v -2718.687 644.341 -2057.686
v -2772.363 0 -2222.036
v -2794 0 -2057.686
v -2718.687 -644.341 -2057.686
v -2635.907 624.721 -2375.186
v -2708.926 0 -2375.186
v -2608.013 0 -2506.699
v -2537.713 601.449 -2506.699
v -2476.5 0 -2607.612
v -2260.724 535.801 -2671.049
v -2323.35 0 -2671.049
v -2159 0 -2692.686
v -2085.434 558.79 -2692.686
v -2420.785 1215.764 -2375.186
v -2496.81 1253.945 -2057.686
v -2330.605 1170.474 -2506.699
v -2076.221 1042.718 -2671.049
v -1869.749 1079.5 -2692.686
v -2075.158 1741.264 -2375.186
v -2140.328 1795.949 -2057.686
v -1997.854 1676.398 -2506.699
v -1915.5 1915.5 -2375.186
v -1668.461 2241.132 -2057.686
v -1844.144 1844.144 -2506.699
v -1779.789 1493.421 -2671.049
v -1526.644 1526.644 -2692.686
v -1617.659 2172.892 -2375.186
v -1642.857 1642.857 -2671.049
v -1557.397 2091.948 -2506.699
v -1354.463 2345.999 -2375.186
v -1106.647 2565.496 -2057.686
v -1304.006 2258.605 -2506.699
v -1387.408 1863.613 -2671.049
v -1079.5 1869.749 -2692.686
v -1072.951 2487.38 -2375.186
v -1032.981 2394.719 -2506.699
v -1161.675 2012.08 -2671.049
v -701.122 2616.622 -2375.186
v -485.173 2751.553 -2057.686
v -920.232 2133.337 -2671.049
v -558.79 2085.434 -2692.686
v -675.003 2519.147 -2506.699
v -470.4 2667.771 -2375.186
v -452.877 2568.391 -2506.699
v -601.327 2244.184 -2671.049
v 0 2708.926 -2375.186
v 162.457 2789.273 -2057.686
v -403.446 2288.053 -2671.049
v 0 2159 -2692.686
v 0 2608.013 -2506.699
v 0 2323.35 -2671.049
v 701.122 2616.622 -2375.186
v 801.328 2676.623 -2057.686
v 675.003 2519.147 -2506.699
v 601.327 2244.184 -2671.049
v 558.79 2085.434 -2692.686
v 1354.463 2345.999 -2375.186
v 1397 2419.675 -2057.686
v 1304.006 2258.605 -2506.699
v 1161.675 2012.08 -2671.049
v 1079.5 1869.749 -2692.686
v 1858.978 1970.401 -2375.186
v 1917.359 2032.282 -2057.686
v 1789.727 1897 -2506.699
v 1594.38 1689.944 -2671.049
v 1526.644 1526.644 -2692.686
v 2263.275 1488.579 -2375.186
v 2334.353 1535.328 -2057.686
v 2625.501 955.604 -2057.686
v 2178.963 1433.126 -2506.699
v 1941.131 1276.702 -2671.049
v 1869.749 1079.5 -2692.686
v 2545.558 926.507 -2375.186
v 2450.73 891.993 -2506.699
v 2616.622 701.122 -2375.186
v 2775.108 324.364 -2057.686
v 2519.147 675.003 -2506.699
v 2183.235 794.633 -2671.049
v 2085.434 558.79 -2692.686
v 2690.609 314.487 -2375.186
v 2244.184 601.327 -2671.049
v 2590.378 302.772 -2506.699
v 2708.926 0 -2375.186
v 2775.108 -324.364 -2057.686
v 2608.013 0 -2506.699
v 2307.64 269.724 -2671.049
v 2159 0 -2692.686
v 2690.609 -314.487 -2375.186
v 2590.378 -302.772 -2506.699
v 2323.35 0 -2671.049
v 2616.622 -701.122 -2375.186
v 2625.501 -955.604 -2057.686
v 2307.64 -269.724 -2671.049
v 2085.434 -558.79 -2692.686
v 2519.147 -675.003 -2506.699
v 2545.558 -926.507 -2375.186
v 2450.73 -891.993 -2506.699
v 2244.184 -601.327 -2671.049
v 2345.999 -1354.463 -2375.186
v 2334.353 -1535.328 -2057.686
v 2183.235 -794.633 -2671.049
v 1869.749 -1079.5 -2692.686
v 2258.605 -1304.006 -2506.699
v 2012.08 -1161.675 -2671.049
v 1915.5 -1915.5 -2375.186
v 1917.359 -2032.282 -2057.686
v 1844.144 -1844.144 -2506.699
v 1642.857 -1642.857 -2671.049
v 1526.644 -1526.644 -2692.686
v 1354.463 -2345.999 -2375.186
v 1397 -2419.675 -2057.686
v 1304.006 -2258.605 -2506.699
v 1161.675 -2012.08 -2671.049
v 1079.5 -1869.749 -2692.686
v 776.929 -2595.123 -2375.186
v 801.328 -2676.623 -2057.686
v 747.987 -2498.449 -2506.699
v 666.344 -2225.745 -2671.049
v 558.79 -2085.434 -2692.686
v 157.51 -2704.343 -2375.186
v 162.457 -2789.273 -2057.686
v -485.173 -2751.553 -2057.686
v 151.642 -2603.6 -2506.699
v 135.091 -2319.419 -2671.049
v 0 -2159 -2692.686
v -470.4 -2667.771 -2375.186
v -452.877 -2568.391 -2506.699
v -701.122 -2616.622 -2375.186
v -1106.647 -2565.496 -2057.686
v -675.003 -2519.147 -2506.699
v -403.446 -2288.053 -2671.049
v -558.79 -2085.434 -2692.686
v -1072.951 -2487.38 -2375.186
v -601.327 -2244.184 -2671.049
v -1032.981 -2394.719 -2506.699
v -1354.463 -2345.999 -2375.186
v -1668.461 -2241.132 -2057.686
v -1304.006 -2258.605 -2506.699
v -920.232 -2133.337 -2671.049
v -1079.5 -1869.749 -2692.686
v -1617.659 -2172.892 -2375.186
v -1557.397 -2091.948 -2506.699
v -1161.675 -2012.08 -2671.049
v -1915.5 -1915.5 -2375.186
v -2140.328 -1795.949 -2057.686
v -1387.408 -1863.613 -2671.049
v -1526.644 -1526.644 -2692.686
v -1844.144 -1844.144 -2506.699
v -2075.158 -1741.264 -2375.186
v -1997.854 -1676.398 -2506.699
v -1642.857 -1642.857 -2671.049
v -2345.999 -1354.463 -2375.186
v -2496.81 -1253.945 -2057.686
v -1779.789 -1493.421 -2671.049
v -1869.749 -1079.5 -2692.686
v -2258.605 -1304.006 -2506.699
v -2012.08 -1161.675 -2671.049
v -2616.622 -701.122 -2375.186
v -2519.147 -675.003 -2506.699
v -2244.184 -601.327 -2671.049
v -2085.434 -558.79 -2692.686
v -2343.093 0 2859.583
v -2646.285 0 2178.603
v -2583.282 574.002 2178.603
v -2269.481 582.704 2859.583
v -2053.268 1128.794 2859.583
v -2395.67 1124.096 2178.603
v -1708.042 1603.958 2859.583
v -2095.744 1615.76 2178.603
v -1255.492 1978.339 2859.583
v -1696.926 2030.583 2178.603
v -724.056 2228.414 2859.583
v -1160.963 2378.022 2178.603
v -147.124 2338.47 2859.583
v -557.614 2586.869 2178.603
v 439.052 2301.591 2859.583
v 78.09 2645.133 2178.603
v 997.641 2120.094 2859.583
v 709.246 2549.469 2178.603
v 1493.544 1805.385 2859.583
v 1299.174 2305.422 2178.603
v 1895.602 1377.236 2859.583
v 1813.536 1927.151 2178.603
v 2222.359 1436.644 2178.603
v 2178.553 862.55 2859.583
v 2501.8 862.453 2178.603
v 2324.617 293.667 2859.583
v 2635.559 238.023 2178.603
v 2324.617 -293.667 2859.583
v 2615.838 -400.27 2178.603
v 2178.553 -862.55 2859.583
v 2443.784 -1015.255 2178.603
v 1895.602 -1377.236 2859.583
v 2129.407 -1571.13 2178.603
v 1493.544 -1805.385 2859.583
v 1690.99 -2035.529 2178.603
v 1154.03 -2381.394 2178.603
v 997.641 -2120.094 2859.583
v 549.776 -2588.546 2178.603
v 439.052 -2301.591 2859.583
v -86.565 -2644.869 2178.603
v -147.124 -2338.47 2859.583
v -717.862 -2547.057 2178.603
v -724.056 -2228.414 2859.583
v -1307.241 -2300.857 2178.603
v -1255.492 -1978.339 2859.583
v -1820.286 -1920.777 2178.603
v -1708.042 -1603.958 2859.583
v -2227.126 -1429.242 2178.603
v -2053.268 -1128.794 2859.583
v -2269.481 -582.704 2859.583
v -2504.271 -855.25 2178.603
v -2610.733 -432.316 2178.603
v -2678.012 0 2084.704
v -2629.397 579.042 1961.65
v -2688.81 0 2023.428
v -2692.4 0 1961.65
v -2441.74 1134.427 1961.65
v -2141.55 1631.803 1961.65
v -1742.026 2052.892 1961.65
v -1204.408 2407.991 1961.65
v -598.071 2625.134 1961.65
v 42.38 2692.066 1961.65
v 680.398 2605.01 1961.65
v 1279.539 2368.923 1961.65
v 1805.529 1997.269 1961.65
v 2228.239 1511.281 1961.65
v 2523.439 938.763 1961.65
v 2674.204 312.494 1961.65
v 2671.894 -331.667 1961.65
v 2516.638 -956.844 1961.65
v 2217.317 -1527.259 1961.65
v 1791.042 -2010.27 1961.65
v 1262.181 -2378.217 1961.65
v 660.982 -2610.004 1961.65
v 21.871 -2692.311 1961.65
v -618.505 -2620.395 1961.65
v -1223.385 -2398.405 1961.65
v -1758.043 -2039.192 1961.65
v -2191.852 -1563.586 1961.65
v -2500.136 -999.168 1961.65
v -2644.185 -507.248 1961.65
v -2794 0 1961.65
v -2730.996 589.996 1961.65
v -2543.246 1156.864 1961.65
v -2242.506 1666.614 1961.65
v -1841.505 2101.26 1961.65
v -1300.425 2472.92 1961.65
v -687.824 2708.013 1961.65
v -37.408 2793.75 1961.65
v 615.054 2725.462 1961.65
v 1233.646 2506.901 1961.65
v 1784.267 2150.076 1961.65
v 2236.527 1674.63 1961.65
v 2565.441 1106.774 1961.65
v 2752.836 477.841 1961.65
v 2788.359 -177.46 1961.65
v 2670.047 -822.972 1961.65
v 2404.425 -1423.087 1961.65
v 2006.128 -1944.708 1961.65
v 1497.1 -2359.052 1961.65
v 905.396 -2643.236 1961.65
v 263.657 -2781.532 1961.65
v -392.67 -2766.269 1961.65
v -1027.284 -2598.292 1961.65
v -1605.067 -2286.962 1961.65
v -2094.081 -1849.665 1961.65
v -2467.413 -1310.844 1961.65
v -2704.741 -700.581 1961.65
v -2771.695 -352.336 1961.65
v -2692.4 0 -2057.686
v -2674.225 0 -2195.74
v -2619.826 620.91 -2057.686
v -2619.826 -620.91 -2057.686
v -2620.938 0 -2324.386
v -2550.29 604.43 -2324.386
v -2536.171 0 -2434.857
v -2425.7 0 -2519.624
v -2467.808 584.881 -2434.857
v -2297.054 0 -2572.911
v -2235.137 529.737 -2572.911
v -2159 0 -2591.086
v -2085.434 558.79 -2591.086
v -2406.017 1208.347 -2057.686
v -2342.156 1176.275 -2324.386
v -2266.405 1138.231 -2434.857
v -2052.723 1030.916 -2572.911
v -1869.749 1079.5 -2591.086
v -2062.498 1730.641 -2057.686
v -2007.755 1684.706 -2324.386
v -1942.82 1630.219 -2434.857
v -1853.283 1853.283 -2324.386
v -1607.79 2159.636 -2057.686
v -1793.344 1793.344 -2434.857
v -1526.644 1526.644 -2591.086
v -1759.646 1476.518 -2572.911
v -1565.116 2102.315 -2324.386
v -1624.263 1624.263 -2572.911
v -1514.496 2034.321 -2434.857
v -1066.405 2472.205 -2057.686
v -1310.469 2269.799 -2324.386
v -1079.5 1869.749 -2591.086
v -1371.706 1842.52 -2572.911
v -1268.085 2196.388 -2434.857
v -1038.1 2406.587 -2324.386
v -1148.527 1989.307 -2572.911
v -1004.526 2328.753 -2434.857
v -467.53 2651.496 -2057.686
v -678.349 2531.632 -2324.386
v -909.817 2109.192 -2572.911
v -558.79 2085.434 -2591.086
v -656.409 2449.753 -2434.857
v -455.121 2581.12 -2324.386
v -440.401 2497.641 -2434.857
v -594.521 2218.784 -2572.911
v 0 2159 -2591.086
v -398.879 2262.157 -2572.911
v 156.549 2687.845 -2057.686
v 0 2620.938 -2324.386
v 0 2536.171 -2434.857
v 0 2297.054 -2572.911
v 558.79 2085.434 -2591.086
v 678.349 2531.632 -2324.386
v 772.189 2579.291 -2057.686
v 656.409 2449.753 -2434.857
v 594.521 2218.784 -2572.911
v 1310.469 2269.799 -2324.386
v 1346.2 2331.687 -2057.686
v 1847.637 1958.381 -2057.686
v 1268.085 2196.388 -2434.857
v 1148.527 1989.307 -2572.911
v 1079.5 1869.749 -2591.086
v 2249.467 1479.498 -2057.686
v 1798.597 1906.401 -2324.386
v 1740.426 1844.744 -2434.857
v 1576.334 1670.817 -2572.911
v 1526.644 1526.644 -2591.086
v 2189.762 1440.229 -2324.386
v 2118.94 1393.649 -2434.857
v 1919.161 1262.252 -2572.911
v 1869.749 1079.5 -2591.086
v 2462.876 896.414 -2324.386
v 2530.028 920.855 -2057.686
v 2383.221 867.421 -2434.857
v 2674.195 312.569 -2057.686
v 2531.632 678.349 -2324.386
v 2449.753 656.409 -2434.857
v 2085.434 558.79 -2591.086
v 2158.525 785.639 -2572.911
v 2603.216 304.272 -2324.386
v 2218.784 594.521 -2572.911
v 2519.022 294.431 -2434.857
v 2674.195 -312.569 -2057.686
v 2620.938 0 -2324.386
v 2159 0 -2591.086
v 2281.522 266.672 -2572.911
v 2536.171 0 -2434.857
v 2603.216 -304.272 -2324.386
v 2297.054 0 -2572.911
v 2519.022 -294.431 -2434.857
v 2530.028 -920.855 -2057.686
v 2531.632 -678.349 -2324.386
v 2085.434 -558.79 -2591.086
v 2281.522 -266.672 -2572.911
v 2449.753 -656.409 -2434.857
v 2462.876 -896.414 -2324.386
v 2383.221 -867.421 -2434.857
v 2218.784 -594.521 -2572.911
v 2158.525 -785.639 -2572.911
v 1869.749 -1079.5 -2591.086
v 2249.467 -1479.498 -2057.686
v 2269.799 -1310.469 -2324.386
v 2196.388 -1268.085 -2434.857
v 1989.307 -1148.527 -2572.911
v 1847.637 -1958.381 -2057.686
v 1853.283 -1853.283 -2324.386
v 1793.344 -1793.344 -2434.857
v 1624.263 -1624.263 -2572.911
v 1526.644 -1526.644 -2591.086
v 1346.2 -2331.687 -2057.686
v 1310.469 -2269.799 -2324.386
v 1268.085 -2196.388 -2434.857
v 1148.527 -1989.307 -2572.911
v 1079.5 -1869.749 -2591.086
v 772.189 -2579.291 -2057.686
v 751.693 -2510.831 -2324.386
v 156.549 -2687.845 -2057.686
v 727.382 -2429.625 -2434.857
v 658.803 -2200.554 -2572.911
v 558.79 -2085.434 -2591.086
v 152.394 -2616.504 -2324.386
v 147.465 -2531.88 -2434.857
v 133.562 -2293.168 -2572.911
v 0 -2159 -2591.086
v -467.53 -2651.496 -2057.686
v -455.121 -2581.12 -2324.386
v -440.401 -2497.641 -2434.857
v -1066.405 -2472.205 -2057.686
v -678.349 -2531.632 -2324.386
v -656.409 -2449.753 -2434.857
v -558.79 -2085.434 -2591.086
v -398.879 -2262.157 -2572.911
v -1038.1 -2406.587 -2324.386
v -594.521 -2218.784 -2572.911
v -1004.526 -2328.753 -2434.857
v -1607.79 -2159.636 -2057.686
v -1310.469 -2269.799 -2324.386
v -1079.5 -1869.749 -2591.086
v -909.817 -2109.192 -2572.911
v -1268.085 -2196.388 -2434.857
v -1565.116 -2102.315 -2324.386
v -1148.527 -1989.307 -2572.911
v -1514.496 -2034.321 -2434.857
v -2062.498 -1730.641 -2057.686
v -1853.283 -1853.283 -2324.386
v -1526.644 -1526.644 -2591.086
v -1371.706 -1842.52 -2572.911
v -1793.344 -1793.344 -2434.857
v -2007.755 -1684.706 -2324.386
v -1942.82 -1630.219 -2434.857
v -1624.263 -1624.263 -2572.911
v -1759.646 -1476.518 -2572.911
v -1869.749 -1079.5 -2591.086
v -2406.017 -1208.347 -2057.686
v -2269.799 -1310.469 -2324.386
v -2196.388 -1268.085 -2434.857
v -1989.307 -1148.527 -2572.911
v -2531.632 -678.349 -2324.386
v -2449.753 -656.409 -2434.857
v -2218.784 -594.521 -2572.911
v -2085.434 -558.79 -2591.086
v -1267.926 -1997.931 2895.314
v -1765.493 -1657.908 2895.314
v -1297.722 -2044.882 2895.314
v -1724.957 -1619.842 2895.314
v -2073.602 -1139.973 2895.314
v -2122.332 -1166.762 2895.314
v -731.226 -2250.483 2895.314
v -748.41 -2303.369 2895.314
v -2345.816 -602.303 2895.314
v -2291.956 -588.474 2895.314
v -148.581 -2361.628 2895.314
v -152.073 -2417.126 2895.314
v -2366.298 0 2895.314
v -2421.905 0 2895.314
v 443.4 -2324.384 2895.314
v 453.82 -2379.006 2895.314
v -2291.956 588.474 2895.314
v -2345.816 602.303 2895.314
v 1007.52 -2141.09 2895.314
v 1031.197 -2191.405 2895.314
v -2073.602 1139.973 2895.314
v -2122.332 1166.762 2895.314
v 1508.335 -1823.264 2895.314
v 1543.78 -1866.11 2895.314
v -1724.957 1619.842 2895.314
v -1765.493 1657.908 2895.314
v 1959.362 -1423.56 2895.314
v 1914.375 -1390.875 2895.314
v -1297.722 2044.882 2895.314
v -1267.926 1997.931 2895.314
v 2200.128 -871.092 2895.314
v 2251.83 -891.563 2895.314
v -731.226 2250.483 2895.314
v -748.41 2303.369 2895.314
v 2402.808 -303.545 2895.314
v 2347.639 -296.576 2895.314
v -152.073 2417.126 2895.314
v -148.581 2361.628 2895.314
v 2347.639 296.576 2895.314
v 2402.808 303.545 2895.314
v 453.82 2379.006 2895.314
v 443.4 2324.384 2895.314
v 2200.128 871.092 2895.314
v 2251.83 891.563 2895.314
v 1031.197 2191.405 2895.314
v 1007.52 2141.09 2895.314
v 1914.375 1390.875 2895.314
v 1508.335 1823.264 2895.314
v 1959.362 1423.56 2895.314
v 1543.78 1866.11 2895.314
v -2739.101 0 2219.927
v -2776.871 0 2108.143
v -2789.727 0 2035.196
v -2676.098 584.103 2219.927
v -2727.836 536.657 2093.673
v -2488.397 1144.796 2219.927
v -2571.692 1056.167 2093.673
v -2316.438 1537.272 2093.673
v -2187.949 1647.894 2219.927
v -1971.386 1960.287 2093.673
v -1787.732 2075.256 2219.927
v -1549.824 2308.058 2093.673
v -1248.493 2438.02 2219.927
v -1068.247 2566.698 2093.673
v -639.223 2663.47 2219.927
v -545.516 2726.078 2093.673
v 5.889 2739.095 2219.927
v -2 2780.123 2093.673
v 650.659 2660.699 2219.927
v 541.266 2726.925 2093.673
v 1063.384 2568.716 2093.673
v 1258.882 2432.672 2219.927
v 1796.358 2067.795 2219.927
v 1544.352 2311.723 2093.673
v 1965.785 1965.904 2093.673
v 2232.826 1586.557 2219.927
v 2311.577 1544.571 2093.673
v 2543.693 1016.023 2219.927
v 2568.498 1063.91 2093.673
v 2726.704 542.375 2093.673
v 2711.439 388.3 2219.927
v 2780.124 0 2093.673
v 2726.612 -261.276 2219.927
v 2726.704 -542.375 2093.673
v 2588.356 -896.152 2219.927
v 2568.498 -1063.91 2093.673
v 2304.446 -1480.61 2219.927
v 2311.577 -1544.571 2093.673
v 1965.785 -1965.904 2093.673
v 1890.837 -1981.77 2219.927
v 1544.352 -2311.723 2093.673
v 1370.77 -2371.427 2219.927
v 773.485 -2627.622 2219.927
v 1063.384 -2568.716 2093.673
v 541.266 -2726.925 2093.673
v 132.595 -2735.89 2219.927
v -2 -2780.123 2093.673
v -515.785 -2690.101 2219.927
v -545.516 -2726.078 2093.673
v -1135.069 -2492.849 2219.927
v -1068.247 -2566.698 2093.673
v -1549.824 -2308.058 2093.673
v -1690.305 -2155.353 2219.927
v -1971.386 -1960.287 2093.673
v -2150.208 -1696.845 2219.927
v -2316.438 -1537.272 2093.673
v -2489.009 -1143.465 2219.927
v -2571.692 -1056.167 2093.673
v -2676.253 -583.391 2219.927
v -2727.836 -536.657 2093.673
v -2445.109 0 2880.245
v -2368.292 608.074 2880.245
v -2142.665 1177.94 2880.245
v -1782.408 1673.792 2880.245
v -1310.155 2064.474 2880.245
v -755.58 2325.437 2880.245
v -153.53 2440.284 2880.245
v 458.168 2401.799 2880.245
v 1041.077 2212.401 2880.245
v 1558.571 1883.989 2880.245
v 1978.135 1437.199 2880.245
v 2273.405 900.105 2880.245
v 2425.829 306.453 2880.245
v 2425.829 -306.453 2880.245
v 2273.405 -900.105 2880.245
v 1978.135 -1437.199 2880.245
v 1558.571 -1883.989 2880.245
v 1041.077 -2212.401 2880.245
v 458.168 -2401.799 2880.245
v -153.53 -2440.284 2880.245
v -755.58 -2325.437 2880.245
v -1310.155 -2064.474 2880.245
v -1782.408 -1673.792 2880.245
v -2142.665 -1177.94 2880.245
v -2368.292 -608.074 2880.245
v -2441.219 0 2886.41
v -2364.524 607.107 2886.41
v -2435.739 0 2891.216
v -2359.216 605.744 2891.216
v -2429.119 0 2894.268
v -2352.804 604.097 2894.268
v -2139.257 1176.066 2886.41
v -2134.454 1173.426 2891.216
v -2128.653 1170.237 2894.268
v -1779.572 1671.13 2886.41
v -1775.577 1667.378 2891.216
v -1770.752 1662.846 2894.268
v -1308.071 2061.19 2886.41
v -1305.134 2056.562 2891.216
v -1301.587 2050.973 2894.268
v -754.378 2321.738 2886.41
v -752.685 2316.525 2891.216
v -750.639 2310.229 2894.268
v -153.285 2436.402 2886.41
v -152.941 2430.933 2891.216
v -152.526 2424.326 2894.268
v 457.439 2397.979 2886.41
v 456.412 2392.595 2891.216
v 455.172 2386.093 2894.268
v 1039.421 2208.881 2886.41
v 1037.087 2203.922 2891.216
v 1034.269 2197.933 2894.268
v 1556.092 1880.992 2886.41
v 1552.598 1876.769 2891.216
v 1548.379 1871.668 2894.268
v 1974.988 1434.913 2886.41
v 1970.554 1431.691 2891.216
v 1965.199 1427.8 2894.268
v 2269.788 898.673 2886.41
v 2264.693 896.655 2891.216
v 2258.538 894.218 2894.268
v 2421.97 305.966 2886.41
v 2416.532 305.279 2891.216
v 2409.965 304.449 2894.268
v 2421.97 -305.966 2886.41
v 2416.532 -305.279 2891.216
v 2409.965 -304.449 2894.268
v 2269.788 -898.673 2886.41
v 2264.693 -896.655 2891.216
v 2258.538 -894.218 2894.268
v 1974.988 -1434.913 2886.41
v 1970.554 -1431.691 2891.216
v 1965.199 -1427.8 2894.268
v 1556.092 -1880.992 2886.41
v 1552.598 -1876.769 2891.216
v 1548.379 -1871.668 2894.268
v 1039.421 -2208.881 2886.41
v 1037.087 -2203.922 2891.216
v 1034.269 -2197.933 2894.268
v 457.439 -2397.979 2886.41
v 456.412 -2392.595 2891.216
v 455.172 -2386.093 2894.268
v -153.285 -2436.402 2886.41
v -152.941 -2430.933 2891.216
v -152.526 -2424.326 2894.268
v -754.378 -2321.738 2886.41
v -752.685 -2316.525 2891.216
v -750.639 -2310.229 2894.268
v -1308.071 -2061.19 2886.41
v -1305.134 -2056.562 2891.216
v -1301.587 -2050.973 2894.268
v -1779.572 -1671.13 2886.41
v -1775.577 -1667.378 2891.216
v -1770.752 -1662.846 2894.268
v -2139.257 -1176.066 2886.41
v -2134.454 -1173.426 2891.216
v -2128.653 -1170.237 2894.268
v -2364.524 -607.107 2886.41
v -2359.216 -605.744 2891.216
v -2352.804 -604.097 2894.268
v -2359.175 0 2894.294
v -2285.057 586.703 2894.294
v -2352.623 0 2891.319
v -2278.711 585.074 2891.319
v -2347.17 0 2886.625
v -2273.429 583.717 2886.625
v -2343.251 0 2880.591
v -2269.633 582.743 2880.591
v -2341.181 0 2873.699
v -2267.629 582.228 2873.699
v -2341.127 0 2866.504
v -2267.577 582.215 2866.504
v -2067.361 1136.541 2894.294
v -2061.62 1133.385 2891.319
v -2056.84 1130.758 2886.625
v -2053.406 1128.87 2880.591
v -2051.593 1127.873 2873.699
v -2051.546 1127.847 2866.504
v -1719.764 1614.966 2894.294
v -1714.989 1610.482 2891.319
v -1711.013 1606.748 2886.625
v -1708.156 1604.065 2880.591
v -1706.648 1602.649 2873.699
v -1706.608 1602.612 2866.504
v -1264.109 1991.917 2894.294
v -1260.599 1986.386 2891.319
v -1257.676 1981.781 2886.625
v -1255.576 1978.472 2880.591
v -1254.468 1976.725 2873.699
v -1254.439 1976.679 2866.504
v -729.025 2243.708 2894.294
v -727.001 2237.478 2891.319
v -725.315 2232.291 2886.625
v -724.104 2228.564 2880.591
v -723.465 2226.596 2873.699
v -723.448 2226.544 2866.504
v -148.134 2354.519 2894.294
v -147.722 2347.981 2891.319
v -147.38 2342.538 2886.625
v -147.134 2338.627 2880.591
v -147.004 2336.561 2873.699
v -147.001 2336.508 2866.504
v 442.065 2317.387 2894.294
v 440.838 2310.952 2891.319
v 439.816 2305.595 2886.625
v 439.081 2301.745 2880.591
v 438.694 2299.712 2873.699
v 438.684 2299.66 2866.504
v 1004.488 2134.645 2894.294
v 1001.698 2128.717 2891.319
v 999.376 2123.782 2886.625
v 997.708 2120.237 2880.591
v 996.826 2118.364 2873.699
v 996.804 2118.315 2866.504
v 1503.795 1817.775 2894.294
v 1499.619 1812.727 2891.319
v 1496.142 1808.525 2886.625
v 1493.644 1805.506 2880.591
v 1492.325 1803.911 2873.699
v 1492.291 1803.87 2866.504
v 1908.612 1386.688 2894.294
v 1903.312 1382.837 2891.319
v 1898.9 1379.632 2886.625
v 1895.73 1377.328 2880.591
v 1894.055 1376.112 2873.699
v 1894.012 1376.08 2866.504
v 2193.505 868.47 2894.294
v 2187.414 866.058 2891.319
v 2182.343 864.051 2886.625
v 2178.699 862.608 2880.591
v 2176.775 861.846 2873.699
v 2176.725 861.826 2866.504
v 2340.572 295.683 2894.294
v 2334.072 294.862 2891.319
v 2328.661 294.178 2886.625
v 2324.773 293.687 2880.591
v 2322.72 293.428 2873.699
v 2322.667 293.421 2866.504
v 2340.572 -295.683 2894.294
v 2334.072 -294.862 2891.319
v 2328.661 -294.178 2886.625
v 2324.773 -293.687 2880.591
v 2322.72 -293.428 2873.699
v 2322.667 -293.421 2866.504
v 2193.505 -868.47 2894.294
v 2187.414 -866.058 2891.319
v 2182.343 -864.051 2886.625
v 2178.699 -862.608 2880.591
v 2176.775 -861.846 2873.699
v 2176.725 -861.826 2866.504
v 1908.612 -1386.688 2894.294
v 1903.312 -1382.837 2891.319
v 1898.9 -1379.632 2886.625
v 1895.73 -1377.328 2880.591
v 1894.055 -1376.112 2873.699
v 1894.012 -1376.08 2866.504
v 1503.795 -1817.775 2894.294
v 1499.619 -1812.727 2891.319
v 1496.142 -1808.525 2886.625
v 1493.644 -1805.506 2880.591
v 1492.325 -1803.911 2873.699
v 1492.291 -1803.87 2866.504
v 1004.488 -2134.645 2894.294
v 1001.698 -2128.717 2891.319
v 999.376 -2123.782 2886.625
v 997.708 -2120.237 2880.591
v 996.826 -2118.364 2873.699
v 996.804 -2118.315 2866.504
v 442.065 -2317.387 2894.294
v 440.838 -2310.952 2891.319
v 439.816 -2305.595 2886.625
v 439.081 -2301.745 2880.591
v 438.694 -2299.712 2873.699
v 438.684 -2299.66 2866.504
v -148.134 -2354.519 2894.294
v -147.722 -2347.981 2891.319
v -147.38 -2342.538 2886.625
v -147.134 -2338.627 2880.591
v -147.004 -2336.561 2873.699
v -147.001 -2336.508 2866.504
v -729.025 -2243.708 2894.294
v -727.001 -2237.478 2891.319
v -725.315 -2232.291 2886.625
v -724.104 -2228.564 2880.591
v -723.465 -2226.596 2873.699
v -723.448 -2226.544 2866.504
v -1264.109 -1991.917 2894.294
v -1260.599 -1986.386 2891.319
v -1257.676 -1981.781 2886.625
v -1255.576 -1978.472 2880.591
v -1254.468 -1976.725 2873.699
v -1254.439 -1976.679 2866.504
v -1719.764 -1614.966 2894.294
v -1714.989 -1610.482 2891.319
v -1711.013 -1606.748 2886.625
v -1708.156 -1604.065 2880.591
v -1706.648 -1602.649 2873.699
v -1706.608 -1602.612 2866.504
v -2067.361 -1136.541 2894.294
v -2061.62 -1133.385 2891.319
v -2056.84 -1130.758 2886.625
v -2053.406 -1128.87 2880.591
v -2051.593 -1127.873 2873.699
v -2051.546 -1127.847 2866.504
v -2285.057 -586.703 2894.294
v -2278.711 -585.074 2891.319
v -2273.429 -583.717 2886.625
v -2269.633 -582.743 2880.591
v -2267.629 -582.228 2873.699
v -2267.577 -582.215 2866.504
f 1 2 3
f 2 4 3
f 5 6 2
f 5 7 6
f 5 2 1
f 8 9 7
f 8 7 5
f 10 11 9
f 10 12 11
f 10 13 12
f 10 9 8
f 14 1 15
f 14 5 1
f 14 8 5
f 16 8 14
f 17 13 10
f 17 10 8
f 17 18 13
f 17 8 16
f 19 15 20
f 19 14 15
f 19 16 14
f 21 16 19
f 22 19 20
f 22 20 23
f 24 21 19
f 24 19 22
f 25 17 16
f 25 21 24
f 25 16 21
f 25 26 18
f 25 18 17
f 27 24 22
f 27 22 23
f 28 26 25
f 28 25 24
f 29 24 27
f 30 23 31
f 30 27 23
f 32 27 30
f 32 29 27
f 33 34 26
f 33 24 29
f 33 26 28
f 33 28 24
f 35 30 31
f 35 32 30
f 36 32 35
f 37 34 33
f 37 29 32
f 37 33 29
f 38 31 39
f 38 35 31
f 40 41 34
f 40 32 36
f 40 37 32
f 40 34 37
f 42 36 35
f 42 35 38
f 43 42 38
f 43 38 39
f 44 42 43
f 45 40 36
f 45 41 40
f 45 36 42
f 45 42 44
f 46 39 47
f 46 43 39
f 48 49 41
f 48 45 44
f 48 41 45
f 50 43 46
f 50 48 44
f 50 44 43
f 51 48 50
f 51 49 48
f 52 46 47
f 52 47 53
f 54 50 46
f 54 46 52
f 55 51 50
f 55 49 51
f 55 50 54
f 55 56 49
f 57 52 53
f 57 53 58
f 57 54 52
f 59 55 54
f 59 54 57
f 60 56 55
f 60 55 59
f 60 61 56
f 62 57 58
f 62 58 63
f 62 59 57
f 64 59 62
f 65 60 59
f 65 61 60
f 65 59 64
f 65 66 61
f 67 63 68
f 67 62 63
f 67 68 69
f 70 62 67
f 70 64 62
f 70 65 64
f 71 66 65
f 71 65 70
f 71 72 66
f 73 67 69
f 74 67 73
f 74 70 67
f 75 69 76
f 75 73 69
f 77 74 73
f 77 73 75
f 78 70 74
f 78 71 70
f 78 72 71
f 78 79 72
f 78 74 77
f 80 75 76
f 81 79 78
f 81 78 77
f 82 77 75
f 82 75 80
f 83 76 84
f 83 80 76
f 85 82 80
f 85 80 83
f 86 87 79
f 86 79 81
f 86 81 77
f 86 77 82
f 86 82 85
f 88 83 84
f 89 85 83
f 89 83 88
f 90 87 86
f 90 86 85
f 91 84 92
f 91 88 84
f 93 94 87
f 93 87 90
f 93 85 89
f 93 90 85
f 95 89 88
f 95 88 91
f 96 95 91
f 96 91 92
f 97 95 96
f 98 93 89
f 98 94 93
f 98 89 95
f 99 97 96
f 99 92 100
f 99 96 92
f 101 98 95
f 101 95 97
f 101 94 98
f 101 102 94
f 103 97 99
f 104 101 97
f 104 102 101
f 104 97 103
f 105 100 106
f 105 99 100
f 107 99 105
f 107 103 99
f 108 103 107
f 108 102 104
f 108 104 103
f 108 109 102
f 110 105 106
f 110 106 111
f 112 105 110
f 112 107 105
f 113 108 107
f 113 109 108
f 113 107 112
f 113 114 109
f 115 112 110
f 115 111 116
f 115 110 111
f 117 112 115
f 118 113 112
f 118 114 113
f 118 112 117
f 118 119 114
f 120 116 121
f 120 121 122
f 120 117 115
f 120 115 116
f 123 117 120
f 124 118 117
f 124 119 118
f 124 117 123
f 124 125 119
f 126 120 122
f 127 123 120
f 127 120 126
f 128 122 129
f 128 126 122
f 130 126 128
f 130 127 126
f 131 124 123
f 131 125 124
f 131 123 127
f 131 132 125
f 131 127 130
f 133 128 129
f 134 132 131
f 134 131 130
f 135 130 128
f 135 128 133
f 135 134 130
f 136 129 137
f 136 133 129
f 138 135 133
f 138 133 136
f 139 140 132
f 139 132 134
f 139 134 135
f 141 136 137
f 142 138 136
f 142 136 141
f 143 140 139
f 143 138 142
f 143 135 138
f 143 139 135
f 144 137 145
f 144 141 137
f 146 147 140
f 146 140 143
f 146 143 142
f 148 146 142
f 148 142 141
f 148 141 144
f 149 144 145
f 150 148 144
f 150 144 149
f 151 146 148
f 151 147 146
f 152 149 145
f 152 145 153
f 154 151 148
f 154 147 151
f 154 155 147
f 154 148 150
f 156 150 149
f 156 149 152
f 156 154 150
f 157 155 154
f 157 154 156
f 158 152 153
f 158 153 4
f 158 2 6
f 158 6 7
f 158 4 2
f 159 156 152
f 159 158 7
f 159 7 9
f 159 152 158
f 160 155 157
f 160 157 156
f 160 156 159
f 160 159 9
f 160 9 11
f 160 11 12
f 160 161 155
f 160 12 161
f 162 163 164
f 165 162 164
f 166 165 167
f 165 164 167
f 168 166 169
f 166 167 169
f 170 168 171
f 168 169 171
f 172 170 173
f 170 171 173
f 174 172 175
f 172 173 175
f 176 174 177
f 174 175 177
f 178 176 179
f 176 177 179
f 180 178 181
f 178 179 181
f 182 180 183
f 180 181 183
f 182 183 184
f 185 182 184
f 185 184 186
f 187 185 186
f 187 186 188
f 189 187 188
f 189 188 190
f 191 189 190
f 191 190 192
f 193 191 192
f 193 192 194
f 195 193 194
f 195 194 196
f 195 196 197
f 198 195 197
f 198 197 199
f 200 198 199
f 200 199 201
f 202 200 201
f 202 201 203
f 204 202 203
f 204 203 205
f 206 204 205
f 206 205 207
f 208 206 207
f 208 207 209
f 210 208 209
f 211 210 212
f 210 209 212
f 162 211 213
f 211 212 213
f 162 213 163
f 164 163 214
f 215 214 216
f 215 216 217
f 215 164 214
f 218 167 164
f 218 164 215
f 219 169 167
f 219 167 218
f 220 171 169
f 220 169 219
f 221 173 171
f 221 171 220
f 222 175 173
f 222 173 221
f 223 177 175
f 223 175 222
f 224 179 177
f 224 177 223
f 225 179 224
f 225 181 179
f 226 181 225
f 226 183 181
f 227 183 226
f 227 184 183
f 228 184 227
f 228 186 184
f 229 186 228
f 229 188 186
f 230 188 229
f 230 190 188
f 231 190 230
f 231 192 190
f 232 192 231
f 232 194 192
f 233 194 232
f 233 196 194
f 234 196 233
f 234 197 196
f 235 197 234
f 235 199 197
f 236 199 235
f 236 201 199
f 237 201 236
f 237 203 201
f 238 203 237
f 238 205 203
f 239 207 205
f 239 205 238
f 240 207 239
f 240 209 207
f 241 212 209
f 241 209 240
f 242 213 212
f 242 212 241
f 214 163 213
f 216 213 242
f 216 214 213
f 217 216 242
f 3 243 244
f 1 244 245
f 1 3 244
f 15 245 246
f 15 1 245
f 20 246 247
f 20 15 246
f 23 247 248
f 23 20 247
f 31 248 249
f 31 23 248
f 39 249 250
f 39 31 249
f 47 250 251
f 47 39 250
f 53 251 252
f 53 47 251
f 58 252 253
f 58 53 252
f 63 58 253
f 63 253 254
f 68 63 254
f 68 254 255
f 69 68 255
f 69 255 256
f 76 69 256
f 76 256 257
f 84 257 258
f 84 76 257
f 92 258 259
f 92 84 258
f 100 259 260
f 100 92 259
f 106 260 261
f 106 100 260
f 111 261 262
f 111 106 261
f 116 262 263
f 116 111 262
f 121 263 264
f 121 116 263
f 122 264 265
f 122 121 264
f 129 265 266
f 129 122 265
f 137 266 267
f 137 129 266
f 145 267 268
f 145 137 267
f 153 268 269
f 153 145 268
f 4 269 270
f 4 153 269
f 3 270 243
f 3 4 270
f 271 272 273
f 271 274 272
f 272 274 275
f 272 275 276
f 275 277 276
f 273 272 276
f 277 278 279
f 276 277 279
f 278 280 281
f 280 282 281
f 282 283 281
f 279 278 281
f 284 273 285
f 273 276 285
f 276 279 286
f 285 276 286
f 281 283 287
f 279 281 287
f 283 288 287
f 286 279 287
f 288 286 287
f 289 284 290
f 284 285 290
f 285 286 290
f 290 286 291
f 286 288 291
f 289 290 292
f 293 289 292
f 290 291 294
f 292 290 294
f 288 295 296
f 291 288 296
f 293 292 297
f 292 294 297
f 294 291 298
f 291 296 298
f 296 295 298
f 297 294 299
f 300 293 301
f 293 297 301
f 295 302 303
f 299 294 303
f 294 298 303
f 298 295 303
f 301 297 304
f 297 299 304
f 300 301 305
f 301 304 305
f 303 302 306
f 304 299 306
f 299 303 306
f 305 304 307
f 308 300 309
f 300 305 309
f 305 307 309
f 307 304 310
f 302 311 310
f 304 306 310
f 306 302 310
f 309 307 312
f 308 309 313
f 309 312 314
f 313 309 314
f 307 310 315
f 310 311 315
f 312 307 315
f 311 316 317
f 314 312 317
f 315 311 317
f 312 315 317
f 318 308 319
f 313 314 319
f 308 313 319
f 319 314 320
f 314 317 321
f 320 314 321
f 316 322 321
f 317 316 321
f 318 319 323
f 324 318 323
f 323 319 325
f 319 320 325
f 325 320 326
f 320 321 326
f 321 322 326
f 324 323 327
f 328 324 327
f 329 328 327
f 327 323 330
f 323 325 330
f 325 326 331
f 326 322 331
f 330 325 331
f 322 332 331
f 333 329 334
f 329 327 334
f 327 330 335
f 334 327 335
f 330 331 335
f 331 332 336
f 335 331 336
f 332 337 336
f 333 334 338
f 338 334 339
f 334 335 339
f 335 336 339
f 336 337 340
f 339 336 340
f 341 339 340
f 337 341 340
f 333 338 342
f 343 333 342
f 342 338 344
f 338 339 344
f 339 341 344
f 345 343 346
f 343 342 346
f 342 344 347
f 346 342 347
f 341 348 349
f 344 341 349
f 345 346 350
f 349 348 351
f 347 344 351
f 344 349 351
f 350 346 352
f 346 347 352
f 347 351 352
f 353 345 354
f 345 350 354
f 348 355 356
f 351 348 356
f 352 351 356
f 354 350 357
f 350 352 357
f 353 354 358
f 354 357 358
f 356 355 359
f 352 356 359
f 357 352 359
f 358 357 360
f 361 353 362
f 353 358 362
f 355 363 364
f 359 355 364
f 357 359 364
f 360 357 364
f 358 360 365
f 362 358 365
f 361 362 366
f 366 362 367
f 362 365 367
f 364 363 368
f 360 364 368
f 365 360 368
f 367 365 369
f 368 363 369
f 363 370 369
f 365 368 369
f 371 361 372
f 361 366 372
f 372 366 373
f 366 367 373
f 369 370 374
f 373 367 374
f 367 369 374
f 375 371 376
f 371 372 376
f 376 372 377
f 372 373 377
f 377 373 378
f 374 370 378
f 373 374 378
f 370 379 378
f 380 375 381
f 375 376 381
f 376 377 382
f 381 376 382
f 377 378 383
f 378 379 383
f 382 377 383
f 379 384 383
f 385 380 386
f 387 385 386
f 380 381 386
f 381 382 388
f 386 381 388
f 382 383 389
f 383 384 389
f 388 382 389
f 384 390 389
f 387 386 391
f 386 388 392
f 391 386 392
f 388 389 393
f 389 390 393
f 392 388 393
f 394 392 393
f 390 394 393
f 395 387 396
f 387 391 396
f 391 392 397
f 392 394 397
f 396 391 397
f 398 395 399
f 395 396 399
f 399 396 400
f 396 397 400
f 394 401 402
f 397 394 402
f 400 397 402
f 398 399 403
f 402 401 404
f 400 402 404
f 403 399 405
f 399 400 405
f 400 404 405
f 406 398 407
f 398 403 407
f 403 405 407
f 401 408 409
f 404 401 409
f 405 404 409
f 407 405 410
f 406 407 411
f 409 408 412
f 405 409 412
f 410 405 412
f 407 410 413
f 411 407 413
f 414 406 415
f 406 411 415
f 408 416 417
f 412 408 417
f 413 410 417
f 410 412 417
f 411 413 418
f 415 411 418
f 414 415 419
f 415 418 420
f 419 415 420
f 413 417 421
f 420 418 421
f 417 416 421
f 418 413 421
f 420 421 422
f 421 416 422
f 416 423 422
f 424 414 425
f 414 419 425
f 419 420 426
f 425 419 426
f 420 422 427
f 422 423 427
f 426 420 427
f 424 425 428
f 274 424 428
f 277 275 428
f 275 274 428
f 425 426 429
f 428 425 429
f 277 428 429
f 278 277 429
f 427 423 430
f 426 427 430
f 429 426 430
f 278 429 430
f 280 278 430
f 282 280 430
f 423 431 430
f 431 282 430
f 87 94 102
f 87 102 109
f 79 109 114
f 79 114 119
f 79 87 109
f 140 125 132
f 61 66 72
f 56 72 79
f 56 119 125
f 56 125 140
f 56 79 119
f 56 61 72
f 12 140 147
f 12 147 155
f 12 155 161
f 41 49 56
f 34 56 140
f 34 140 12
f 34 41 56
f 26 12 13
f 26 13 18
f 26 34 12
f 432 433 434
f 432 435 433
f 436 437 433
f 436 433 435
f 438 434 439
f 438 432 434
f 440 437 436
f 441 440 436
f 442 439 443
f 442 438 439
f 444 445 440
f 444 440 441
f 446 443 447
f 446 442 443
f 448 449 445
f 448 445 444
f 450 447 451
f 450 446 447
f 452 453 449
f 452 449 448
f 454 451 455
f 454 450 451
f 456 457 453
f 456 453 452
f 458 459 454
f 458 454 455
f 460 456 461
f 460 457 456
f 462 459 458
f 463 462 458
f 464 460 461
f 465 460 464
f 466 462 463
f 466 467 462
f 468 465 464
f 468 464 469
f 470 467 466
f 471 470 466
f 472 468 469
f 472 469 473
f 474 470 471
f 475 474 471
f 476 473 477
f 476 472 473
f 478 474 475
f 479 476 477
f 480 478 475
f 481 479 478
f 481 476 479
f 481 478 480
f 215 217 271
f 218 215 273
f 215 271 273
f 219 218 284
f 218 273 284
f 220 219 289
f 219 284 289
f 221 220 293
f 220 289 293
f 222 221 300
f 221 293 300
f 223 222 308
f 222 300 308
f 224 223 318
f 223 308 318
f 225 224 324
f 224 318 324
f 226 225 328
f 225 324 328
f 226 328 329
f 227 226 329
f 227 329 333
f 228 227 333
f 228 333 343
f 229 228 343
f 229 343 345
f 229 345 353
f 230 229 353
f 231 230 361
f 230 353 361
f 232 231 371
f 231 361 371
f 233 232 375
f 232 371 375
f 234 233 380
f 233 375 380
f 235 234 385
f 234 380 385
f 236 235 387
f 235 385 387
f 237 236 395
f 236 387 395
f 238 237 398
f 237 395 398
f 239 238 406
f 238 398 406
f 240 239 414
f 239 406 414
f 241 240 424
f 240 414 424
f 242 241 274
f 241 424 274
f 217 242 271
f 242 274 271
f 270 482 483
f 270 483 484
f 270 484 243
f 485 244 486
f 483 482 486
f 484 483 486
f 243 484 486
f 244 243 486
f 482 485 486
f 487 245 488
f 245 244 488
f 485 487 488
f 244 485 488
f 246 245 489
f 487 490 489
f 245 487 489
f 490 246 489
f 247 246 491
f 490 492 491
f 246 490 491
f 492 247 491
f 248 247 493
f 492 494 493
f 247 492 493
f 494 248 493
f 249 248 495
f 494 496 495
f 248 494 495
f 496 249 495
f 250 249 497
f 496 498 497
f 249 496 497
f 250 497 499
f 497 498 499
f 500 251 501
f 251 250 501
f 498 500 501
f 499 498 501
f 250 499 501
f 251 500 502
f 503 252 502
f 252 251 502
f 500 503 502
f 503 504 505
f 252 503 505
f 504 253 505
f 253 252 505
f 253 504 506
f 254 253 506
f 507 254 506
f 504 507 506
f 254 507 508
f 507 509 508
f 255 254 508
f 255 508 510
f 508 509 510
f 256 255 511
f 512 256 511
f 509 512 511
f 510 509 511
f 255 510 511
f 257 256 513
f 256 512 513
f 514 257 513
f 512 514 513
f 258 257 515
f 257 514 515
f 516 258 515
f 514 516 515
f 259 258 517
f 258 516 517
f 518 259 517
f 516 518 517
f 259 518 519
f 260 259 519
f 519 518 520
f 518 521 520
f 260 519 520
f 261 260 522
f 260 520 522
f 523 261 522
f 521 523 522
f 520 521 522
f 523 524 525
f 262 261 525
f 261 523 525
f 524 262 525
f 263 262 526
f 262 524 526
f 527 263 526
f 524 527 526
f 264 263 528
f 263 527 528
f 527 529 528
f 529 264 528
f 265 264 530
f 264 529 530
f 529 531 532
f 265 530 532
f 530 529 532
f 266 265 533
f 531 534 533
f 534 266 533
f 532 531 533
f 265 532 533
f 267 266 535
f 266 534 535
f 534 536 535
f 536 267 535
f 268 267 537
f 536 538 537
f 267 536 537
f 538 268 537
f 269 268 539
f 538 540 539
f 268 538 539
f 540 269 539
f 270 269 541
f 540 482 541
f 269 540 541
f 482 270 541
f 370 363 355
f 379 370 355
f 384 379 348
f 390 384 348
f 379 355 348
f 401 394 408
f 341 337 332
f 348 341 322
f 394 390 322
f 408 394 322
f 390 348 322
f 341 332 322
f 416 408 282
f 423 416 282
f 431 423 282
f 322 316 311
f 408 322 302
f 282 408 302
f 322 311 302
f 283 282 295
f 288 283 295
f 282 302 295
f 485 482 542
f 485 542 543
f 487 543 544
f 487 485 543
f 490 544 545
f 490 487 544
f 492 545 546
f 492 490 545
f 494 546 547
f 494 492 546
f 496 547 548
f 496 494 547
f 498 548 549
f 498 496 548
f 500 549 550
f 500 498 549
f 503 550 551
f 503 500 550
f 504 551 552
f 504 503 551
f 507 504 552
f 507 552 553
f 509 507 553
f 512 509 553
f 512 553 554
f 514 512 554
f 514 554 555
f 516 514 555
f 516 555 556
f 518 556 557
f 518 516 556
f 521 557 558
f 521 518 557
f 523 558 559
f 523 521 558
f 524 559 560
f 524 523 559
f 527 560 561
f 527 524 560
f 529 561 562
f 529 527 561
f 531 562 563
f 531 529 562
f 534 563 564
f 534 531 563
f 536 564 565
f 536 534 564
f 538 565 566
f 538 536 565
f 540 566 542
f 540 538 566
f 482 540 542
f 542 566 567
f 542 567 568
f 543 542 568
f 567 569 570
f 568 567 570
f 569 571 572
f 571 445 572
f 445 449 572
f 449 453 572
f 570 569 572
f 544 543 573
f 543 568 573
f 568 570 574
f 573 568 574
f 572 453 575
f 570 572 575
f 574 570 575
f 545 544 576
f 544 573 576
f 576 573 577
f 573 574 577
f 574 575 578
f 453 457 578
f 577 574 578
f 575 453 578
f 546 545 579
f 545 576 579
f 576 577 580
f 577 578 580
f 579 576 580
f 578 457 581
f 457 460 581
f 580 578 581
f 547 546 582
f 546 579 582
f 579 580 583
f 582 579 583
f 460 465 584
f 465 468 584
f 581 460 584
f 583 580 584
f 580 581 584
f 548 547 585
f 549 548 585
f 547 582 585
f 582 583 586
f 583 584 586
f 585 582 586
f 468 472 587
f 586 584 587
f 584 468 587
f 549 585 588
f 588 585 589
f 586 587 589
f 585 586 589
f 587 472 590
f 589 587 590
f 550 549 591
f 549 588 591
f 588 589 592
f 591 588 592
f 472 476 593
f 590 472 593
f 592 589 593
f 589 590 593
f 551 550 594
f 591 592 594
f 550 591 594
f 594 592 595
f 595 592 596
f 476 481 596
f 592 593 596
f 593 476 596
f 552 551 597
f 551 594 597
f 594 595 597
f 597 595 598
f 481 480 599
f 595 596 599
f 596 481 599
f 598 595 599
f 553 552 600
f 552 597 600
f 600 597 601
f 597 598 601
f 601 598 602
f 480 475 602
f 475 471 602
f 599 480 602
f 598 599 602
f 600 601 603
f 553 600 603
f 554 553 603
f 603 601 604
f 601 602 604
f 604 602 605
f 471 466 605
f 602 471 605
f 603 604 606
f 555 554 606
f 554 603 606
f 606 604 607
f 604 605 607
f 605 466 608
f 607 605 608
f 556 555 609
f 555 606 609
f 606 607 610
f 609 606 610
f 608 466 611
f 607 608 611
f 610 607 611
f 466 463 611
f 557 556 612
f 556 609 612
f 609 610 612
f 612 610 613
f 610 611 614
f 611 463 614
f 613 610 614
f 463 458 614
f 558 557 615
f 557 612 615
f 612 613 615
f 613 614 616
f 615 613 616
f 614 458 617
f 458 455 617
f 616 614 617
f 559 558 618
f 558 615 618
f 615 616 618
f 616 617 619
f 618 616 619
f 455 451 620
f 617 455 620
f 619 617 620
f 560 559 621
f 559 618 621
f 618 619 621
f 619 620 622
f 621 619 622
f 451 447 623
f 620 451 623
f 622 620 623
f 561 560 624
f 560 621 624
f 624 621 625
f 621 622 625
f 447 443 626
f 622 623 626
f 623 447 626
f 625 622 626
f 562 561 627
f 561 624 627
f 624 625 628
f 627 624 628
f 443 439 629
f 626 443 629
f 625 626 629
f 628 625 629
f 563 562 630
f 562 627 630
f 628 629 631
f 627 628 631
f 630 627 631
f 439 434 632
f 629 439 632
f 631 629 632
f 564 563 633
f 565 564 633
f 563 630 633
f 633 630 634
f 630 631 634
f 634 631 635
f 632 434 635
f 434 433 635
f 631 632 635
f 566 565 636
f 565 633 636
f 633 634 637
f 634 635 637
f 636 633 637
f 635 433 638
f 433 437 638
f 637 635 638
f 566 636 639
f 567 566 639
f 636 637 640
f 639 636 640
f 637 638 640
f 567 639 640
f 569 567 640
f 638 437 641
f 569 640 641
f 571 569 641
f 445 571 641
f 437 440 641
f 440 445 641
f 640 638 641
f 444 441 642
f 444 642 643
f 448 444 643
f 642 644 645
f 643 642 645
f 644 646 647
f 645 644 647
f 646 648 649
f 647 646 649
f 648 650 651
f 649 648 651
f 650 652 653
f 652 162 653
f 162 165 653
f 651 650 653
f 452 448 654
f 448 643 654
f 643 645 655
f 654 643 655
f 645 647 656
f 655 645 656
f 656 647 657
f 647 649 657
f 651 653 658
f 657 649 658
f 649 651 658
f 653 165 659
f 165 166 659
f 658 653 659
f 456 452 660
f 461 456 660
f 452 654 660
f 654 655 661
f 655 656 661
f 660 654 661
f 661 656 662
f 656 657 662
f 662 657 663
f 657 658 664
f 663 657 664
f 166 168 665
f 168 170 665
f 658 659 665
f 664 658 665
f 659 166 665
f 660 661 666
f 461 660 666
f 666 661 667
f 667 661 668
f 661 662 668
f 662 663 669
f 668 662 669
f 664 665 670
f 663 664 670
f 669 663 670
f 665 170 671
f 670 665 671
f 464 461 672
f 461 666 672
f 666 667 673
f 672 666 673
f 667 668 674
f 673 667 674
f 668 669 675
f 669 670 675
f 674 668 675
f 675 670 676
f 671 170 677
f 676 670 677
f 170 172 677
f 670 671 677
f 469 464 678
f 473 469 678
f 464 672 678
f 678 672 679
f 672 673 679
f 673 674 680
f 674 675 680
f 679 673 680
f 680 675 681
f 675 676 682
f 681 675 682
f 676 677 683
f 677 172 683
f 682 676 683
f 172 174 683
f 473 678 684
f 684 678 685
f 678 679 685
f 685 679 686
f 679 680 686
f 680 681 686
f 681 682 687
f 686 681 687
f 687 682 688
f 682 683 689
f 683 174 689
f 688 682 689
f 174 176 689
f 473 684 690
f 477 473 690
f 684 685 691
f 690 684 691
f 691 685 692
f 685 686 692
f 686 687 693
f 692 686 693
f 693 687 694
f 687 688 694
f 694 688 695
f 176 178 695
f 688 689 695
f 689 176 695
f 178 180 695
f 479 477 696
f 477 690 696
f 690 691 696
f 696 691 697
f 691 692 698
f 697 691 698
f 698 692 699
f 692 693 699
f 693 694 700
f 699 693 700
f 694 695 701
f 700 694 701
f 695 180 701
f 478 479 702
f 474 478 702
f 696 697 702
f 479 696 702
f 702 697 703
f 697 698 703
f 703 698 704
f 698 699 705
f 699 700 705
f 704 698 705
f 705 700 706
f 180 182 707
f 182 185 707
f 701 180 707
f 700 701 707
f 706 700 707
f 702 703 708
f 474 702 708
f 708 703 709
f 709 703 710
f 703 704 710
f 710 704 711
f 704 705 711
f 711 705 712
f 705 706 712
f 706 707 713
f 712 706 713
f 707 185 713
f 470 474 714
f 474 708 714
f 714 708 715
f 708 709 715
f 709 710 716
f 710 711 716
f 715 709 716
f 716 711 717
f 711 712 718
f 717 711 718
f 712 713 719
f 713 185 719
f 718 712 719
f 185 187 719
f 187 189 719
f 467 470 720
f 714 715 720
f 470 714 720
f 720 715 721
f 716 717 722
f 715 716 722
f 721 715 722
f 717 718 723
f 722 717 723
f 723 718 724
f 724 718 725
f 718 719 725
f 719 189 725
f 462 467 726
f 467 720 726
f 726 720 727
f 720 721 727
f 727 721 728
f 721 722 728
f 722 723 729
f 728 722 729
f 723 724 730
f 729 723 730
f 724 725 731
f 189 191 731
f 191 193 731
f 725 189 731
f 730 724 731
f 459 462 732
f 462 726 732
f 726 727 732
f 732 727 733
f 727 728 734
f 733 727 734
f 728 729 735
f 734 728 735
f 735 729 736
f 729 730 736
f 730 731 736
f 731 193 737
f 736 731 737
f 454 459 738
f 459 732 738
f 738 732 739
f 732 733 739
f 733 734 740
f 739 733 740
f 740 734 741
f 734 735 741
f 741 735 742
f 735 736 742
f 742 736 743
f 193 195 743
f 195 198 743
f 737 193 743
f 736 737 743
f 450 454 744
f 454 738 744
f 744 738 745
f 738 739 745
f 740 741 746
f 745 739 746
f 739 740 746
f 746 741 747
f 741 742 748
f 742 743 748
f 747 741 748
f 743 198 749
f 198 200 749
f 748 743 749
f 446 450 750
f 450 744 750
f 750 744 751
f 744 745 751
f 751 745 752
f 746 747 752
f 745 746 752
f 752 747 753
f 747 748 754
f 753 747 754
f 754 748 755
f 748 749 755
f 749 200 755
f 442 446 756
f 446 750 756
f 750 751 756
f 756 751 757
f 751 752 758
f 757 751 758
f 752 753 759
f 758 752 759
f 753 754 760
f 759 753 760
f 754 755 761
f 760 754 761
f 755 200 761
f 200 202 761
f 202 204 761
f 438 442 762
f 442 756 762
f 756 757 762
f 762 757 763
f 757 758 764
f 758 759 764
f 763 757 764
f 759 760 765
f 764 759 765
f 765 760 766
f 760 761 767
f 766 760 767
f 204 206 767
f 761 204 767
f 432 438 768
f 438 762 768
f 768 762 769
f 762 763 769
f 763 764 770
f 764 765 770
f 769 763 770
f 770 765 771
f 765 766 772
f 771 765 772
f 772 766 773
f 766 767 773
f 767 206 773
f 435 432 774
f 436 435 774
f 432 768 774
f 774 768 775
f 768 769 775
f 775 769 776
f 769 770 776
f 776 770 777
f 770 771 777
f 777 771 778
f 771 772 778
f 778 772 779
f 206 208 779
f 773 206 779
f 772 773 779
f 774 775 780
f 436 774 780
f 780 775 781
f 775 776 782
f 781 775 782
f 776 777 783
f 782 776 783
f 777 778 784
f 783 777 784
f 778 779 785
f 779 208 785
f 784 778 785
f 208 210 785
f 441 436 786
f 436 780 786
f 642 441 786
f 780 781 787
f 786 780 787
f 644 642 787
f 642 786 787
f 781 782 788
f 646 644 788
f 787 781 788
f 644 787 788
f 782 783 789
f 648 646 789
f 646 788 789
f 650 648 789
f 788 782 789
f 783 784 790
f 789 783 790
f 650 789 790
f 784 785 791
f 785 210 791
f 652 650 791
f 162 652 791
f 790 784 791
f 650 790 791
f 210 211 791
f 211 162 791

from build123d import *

# Parameters (mm, degrees)
F2_R = 635
F3_T = -101.6
F4_R = 25.4


with BuildPart() as f1:
    # F0 (on Front) → F1 (revolve)
    with BuildSketch(Plane.XZ):
        Polygon((0, 2895.3136389758), (-2438.4, 2895.3136389758), (-2794, 2096.6229621755), (-2794, -2692.6863610242), (0, -2692.6863610242), (0, 0), align=None)
    revolve(axis=Axis((0, 0, 1447.6568194879), (0, 0, -1)))

    # F2
    f2_edges = [f1.edges().sort_by_distance(p)[0] for p in [
        (2794, 0, -2692.686361),
        (2794, 0, 2096.622962),
    ]]
    fillet(f2_edges, radius=F2_R)

    # F3
    f3_openings = [f1.faces().sort_by_distance(p)[0] for p in [
        (0, 0, 2895.313639),
    ]]
    offset(amount=F3_T, openings=f3_openings)

    # F4
    f4_edges = [f1.edges().sort_by_distance(p)[0] for p in [
        (2327.184954, 0, 2895.313639),
        (2438.4, 0, 2895.313639),
    ]]
    fillet(f4_edges, radius=F4_R)


solid = f1.part
